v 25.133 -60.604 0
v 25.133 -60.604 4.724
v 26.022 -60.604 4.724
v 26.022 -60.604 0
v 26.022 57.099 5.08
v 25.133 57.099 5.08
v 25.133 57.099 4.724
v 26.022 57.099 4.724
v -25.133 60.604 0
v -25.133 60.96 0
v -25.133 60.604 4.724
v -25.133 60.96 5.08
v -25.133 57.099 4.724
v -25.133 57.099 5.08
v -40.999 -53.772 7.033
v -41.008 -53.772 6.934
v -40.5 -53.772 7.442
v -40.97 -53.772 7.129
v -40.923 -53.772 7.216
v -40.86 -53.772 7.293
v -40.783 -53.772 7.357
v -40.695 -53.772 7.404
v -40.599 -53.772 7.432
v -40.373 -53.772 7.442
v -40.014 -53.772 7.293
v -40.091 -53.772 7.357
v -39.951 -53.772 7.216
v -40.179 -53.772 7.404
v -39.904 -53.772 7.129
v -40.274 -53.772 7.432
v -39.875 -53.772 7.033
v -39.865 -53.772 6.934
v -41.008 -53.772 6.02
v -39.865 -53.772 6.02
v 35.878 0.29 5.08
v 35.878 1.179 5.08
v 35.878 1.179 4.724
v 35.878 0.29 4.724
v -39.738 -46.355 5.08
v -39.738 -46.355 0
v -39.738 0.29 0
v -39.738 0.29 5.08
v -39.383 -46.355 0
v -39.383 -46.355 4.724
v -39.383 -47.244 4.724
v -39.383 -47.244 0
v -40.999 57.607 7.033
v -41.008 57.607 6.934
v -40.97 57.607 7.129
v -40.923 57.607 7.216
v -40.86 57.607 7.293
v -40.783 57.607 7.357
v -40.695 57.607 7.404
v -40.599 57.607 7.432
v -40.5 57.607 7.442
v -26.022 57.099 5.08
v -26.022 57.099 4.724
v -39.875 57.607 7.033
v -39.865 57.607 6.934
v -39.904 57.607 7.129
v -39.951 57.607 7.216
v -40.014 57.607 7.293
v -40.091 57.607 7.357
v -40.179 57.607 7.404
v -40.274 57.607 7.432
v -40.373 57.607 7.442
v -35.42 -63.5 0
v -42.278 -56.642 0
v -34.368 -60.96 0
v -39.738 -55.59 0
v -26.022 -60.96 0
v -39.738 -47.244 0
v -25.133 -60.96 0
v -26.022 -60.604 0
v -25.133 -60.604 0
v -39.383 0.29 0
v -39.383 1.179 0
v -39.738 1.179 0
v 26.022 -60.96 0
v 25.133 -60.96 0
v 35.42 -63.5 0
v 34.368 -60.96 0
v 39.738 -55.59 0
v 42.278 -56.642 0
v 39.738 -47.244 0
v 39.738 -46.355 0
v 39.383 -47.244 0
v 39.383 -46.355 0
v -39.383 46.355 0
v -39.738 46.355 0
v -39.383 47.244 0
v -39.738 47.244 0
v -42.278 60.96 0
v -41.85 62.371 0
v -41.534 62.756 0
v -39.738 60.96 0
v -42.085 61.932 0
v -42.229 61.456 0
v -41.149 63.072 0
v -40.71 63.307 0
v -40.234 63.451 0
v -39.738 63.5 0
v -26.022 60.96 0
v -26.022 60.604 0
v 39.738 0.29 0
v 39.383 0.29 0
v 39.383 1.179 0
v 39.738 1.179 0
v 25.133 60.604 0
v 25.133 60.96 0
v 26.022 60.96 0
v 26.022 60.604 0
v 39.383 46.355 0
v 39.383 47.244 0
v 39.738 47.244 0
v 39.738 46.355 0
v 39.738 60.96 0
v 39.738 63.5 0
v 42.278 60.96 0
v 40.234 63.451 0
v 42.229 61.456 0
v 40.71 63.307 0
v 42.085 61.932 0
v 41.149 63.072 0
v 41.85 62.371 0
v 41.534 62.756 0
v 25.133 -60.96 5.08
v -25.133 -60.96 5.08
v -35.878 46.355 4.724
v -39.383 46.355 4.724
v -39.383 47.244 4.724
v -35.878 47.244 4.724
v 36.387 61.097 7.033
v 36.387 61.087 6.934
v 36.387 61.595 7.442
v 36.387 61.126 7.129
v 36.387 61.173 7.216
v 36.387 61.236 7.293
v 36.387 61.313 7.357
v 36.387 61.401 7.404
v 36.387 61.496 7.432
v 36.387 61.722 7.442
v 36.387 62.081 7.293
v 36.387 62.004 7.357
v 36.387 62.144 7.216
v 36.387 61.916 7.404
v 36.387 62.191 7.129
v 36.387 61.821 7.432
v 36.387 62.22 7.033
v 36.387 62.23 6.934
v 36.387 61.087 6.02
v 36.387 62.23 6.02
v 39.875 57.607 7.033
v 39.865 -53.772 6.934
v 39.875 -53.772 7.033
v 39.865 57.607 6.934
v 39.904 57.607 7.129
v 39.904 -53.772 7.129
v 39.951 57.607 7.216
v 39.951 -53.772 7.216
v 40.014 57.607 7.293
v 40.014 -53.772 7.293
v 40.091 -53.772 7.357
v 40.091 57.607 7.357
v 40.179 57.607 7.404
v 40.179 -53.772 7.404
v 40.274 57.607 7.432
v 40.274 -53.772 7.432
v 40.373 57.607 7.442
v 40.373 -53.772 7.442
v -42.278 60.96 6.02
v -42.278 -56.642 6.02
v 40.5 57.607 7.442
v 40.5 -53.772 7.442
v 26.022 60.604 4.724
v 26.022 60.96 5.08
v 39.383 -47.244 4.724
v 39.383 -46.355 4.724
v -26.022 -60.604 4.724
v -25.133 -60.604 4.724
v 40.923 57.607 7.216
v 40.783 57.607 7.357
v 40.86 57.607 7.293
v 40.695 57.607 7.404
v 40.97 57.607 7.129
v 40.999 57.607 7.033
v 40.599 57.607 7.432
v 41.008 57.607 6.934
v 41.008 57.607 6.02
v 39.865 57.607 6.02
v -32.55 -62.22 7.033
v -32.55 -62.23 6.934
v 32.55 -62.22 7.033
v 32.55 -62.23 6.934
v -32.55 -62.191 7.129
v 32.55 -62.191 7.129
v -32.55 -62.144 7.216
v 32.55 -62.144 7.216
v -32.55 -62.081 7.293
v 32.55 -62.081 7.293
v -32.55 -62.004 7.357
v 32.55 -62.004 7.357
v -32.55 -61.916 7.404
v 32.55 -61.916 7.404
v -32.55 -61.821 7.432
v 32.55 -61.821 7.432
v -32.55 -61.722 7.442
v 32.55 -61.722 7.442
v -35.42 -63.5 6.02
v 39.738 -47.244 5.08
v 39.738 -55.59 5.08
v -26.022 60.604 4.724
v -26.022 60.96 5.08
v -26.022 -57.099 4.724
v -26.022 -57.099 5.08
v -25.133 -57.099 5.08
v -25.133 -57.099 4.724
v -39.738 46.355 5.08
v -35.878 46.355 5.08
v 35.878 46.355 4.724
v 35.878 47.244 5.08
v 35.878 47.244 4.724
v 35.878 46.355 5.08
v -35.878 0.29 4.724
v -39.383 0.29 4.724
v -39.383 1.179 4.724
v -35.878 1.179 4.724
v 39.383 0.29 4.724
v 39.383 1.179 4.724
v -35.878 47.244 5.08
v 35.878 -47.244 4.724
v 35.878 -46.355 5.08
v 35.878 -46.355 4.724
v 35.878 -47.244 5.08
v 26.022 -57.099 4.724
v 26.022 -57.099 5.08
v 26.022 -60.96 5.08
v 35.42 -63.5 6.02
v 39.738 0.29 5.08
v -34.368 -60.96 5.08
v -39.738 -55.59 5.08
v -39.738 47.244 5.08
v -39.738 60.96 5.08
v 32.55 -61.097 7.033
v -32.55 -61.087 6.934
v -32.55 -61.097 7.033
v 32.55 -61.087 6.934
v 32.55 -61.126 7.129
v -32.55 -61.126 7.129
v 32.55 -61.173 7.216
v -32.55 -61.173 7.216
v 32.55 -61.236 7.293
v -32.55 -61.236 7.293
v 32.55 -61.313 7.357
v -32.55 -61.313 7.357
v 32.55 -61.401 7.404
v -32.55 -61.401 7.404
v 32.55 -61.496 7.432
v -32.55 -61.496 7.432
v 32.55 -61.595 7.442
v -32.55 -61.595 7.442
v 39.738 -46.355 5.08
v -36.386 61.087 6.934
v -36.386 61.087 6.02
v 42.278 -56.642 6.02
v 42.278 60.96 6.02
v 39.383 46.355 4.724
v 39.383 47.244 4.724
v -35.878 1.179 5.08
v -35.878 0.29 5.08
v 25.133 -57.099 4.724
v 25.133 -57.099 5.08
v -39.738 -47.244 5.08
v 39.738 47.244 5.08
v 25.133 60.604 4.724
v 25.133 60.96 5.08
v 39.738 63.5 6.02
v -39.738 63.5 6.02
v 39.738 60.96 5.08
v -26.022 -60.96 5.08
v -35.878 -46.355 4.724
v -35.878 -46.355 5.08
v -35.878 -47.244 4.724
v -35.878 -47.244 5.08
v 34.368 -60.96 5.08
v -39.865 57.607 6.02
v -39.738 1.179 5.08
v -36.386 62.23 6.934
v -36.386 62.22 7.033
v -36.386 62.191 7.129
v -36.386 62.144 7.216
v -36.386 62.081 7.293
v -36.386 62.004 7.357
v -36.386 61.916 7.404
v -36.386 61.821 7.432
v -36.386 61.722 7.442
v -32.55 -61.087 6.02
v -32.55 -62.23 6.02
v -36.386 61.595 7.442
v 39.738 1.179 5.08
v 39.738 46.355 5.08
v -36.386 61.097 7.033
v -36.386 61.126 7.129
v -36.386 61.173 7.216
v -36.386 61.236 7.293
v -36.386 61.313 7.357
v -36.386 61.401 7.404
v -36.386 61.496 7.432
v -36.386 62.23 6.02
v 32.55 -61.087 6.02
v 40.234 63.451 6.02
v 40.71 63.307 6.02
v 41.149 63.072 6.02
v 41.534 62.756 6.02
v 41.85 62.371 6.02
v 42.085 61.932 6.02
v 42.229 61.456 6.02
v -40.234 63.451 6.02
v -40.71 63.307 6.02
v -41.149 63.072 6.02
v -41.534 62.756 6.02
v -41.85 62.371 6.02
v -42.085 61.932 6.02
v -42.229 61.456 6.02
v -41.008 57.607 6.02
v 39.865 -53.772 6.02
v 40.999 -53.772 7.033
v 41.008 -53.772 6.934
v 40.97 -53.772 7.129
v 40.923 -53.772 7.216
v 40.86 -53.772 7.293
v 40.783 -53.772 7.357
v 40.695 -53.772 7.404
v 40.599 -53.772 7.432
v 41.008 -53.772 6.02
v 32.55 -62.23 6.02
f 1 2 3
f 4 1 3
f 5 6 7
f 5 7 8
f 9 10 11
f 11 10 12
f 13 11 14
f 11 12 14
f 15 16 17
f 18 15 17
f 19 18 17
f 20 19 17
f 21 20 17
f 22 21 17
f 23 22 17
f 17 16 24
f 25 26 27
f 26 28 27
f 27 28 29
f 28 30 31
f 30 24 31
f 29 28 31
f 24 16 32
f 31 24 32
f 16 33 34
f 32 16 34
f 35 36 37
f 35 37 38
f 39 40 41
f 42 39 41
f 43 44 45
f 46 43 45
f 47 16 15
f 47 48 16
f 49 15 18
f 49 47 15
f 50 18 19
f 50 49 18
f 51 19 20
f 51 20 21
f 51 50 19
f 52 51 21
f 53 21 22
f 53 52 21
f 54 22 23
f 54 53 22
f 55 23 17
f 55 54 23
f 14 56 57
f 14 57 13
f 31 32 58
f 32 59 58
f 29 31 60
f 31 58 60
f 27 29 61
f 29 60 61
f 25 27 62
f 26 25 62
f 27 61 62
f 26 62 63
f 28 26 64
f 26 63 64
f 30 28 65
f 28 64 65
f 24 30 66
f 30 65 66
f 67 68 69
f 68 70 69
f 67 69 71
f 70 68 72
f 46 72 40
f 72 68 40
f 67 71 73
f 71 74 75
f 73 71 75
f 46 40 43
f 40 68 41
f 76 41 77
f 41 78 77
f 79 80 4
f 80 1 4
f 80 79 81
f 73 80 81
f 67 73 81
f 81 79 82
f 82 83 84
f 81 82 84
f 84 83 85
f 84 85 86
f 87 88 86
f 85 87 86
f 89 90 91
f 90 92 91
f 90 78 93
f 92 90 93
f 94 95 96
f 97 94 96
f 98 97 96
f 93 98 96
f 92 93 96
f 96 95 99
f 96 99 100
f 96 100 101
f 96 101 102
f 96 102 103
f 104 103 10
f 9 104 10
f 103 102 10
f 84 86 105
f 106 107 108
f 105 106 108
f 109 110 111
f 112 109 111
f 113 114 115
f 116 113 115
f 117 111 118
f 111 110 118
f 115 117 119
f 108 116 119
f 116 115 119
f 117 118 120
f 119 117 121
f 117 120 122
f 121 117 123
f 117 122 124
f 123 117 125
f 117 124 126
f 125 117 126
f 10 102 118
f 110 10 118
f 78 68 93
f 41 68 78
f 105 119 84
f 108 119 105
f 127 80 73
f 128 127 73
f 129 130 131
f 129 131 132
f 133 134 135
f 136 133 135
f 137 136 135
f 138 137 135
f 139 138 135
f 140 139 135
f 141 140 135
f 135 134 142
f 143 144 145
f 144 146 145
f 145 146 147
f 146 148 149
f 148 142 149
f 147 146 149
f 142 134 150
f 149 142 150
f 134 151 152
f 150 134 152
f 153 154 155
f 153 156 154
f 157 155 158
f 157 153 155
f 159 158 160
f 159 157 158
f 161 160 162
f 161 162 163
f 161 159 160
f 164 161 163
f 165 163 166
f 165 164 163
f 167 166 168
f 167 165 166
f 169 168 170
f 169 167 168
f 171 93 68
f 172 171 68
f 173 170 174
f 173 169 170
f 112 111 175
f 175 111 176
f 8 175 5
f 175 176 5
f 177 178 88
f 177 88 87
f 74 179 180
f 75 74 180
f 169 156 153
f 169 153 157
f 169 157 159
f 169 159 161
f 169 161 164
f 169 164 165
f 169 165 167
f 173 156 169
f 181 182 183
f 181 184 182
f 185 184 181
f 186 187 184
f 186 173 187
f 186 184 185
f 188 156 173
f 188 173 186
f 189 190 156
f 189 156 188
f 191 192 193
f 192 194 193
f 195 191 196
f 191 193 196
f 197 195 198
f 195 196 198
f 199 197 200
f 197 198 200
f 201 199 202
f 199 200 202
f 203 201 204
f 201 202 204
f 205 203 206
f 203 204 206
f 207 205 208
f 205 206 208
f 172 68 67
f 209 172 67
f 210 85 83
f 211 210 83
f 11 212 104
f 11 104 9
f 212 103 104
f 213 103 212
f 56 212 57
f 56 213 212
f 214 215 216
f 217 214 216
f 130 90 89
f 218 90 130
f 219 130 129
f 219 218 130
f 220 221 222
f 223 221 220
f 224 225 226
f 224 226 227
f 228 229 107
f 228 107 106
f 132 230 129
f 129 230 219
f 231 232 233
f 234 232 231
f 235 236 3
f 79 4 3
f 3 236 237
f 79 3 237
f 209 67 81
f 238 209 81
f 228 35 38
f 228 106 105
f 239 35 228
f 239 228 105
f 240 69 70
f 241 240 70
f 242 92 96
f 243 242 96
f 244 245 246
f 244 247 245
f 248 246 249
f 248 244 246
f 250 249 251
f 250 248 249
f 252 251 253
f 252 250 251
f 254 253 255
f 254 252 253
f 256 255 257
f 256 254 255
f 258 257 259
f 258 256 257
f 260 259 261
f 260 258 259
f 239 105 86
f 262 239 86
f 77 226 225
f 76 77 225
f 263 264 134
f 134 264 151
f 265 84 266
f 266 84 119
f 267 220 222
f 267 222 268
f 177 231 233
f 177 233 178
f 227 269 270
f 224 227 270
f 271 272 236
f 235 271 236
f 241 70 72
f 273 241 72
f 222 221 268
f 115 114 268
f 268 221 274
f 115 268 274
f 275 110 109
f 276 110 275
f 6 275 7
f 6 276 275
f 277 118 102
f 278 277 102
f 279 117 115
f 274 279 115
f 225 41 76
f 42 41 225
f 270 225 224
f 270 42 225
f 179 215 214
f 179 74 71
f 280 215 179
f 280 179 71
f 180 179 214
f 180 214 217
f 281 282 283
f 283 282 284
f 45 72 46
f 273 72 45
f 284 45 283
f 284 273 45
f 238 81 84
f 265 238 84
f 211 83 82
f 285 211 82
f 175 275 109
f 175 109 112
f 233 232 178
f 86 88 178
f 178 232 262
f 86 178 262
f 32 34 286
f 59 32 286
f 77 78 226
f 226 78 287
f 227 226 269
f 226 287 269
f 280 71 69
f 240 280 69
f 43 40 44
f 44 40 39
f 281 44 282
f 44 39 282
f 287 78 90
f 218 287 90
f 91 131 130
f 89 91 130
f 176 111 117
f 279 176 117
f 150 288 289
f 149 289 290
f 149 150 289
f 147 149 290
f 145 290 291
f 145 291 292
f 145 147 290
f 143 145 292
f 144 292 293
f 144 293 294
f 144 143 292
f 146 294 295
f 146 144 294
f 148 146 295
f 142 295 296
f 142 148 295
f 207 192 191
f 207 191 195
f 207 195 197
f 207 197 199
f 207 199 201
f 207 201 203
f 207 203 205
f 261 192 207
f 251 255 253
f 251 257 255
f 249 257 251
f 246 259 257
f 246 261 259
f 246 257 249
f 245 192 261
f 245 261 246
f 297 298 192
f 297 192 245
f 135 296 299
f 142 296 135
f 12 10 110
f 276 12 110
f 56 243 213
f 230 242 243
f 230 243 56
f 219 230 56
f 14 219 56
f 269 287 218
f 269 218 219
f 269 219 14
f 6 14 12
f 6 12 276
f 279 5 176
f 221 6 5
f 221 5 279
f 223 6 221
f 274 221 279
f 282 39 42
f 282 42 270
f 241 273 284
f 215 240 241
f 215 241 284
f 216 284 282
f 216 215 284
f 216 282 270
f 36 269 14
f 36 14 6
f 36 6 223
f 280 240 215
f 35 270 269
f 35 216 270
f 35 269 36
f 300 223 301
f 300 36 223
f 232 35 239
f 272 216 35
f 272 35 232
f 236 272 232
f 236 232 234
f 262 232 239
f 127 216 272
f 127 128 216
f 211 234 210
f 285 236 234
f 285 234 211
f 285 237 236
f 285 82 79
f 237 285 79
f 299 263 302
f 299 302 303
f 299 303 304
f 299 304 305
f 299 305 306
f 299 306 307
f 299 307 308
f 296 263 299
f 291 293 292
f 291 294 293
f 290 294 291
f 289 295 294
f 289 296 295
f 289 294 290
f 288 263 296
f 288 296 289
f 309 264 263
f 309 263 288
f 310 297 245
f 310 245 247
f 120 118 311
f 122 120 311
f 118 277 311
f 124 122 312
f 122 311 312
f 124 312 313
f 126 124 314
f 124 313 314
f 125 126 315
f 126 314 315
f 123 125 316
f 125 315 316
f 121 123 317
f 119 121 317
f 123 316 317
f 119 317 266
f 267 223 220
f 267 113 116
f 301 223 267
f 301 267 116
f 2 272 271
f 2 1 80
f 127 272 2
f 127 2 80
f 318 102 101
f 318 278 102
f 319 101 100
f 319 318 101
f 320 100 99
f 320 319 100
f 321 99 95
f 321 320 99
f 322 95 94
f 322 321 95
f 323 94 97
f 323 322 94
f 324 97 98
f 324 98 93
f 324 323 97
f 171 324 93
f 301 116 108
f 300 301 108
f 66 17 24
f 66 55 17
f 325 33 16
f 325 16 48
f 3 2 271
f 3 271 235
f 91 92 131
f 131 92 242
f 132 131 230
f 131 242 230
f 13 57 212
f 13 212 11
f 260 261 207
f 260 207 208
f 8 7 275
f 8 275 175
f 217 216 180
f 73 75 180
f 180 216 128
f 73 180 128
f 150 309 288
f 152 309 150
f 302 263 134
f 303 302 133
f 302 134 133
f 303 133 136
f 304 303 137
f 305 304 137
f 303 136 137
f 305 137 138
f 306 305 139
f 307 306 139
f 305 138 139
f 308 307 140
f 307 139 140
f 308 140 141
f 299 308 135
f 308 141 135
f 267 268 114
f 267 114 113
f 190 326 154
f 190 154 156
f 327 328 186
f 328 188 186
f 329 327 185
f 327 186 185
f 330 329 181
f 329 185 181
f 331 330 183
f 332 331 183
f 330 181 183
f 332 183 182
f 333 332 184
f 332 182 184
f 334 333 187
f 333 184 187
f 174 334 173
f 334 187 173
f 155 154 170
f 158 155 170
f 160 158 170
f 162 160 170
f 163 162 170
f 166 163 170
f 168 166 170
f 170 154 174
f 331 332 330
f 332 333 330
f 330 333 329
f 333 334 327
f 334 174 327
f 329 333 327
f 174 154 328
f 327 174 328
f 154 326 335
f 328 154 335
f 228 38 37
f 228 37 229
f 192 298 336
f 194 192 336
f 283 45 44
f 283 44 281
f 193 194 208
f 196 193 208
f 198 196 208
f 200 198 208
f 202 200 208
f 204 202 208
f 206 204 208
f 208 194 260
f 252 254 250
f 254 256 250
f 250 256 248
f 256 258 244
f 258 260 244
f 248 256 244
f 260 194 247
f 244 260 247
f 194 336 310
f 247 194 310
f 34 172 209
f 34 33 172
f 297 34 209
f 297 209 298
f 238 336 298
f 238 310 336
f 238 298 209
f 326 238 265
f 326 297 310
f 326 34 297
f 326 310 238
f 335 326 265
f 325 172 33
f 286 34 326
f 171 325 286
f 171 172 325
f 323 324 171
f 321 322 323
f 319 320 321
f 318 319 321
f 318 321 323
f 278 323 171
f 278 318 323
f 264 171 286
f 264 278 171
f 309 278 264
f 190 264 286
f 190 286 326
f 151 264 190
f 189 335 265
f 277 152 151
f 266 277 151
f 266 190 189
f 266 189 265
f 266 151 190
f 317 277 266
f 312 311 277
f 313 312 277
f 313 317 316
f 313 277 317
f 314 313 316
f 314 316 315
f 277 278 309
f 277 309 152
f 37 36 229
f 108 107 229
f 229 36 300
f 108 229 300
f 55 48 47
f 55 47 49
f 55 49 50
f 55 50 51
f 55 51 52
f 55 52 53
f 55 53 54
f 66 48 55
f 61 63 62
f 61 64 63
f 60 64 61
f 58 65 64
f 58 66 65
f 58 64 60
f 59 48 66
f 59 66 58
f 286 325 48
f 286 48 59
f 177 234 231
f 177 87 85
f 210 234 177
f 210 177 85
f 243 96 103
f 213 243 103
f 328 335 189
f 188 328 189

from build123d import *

# Parameters (mm, degrees)
F1_DEPTH  = 6.0198
F2_R      = 2.54
F4_DEPTH  = 5.08
F5_W      = 3.8608
F5_H      = 0.889
F5_W_2    = 0.889
F5_H_2    = 3.8608
F6_DEPTH  = 0.3556
F7_W      = 0.889
F7_H      = 0.3556
F7_W_2    = 0.3556
F7_H_2    = 0.889
F8_DEPTH  = 5.08
F9_W      = 1.143
F9_H      = 111.379
F9_W_2    = 65.1002
F9_H_2    = 1.143
F9_W_3    = 72.772369
F10_DEPTH = 1.4224
F11_R     = 0.508


with BuildPart() as f1:
    # F0 (on Top) → F1 (new body)
    with BuildSketch(Plane.XY):
        Polygon((42.2783, 63.5), (-42.2783, 63.5), (-42.2783, -56.642), (-35.4203, -63.5), (35.4203, -63.5), (42.2783, -56.642), align=None)
    extrude(amount=F1_DEPTH)

    # F2
    f2_edges = [f1.edges().sort_by_distance(p)[0] for p in [
        (-42.2783, 63.5, 3.0099),
        (42.2783, 63.5, 3.0099),
    ]]
    fillet(f2_edges, radius=F2_R)

    # F3 (on face) → F4 (cut)
    with BuildSketch(Plane(origin=(0, 0, 0), x_dir=(1, 0, 0), z_dir=(0, 0, -1))):
        Polygon((-39.7383, 55.589898), (-39.7383, -60.96), (39.7383, -60.96), (39.7383, 55.589898), (34.368198, 60.96), (-34.368198, 60.96), align=None)
    extrude(amount=-F4_DEPTH, mode=Mode.SUBTRACT)

    # F5 (on face) → F6 (join)
    with BuildSketch(Plane(origin=(0, 0, 5.08), x_dir=(1, 0, 0), z_dir=(0, 0, -1))):
        with Locations((37.8079, 46.7995)):
            Rectangle(F5_W, F5_H)
        with Locations((37.8079, -0.734602)):
            Rectangle(F5_W, F5_H)
        with Locations((37.8079, -46.7995)):
            Rectangle(F5_W, F5_H)
        with Locations((25.5778, -59.0296)):
            Rectangle(F5_W_2, F5_H_2)
        with Locations((-25.5778, -59.0296)):
            Rectangle(F5_W_2, F5_H_2)
        with Locations((-37.8079, -46.7995)):
            Rectangle(F5_W, F5_H)
        with Locations((-37.8079, -0.734602)):
            Rectangle(F5_W, F5_H)
        with Locations((-37.8079, 46.7995)):
            Rectangle(F5_W, F5_H)
        with Locations((-25.5778, 59.0296)):
            Rectangle(F5_W_2, F5_H_2)
        with Locations((25.5778, 59.0296)):
            Rectangle(F5_W_2, F5_H_2)
    extrude(amount=F6_DEPTH)

    # F7 (on face) → F8 (join)
    with BuildSketch(Plane(origin=(0, 0, 5.08), x_dir=(1, 0, 0), z_dir=(0, 0, -1))):
        with Locations((-25.5778, 60.7822)):
            Rectangle(F7_W, F7_H)
        with Locations((25.5778, 60.7822)):
            Rectangle(F7_W, F7_H)
        with Locations((39.5605, 46.7995)):
            Rectangle(F7_W_2, F7_H_2)
        with Locations((39.5605, -0.734602)):
            Rectangle(F7_W_2, F7_H_2)
        with Locations((-39.5605, 46.7995)):
            Rectangle(F7_W_2, F7_H_2)
        with Locations((-39.5605, -0.734602)):
            Rectangle(F7_W_2, F7_H_2)
        with Locations((-39.5605, -46.7995)):
            Rectangle(F7_W_2, F7_H_2)
        with Locations((-25.5778, -60.7822)):
            Rectangle(F7_W, F7_H)
        with Locations((25.5778, -60.7822)):
            Rectangle(F7_W, F7_H)
        with Locations((39.5605, -46.7995)):
            Rectangle(F7_W_2, F7_H_2)
    extrude(amount=F8_DEPTH)

    # F9 (on face) → F10 (join)
    with BuildSketch(Plane.XY.offset(6.0198)):
        with Locations((-40.4368, 1.9177)):
            Rectangle(F9_W, F9_H)
        with Locations((0, -61.6585)):
            Rectangle(F9_W_2, F9_H_2)
        with Locations((40.4368, 1.9177)):
            Rectangle(F9_W, F9_H)
        with Locations((0.000684, 61.6585)):
            Rectangle(F9_W_3, F9_H_2)
    extrude(amount=F10_DEPTH)

    # F11
    f11_edges = [f1.edges().sort_by_distance(p)[0] for p in [
        (-41.0083, 1.9177, 7.4422),
        (-39.8653, 1.9177, 7.4422),
        (0.000684, 61.087, 7.4422),
        (0.000684, 62.23, 7.4422),
        (39.8653, 1.9177, 7.4422),
        (41.0083, 1.9177, 7.4422),
        (0, -61.087, 7.4422),
        (0, -62.23, 7.4422),
    ]]
    fillet(f11_edges, radius=F11_R)


solid = f1.part
